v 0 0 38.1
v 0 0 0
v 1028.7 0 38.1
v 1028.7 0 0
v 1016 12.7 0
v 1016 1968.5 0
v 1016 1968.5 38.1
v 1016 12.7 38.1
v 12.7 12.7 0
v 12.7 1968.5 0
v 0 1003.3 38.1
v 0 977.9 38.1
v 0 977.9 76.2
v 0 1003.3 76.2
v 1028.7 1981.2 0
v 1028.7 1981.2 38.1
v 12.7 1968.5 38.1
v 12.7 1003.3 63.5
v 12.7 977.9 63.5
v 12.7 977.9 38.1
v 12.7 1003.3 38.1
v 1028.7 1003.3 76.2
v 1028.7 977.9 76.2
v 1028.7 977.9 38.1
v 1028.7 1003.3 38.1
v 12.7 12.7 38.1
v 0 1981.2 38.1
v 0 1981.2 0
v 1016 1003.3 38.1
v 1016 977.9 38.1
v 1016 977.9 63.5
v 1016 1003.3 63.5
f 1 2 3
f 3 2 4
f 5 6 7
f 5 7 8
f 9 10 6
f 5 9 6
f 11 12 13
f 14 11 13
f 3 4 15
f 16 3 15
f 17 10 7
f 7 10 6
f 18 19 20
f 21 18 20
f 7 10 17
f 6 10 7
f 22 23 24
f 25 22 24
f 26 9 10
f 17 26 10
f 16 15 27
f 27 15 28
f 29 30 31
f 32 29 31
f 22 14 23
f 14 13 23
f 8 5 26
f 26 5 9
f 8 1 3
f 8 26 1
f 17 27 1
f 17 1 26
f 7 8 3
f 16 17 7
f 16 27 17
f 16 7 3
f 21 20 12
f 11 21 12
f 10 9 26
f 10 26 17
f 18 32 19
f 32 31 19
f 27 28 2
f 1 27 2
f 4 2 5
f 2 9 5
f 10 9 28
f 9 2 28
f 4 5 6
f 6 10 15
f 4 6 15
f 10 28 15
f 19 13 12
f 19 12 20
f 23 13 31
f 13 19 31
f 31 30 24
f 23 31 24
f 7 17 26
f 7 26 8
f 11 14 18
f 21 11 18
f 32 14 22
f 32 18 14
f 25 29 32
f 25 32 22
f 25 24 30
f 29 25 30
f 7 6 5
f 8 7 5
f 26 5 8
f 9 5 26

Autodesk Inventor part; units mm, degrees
ref_plane "YZ Plane" through (0, 0, 0) normal (1, 0, 0) x (0, 1, 0)
sketch "Sketch1" plane through (0, 0, 0) normal (0, 0, 1) x (1, 0, 0)
  line L0 (0, 0) -> (1028.7, 0)
  line L1 (1028.7, 0) -> (1028.7, 1981.2)
  line L2 (1028.7, 1981.2) -> (0, 1981.2)
  line L3 (0, 1981.2) -> (0, 0)
  line L4 (12.7, 1968.5) -> (1016, 1968.5)
  line L5 (1016, 1968.5) -> (1016, 12.7)
  line L6 (1016, 12.7) -> (12.7, 12.7)
  line L7 (12.7, 12.7) -> (12.7, 1968.5)
  dimension "d2" = 1981.2
  dimension "d3" = 1028.7
  dimension "d4" = 12.7
extrude "GlassPane" add sketch "Sketch1" along normal blind 38.1 contours L4 L5 L6 L7
extrude "Frame" add sketch "Sketch1" along normal blind 38.1 separate body
ref_plane "Work Plane1" through (0, 990.6, 0) normal (0, 1, 0) x (1, 0, 0)
ref_plane "Work Plane2" through (0, 0, 19.05) normal (0, 0, 1) x (1, 0, 0)
sketch "Sketch2" plane through (0, 990.6, 0) normal (0, 1, 0) x (1, 0, 0)
  line L0 (12.7, -38.1) -> (0, -38.1)
  line L1 (0, -38.1) -> (0, -76.2)
  line L2 (0, -76.2) -> (1028.7, -76.2)
  line L3 (1028.7, -76.2) -> (1028.7, -38.1)
  line L4 (1028.7, -38.1) -> (1016, -38.1)
  line L5 (1016, -38.1) -> (1016, -63.5)
  line L6 (1016, -63.5) -> (12.7, -63.5)
  line L7 (12.7, -63.5) -> (12.7, -38.1)
  dimension "d7" = 12.7
  dimension "d8" = 12.7
  dimension "d9" = 38.1
extrude "Handle" add sketch "Sketch2" along normal mid plane 25.4 separate body
mirror "MirrorExterior" [suppressed]
equation "\"d2\" = Height - FrameWidth"
equation "\"d0\" = 0.375 * Depth"
equation "\"d5\" = 0.375 * Depth"
equation "\"d8\" = d7"
equation "\"Width\" = 2032"
equation "\"Height\" = 2032"
equation "\"Depth\" = 101.6"
equation "\"FrameWidth\" = 50.8"
properties part number "AVADemo_SlidingDoorPanel"
